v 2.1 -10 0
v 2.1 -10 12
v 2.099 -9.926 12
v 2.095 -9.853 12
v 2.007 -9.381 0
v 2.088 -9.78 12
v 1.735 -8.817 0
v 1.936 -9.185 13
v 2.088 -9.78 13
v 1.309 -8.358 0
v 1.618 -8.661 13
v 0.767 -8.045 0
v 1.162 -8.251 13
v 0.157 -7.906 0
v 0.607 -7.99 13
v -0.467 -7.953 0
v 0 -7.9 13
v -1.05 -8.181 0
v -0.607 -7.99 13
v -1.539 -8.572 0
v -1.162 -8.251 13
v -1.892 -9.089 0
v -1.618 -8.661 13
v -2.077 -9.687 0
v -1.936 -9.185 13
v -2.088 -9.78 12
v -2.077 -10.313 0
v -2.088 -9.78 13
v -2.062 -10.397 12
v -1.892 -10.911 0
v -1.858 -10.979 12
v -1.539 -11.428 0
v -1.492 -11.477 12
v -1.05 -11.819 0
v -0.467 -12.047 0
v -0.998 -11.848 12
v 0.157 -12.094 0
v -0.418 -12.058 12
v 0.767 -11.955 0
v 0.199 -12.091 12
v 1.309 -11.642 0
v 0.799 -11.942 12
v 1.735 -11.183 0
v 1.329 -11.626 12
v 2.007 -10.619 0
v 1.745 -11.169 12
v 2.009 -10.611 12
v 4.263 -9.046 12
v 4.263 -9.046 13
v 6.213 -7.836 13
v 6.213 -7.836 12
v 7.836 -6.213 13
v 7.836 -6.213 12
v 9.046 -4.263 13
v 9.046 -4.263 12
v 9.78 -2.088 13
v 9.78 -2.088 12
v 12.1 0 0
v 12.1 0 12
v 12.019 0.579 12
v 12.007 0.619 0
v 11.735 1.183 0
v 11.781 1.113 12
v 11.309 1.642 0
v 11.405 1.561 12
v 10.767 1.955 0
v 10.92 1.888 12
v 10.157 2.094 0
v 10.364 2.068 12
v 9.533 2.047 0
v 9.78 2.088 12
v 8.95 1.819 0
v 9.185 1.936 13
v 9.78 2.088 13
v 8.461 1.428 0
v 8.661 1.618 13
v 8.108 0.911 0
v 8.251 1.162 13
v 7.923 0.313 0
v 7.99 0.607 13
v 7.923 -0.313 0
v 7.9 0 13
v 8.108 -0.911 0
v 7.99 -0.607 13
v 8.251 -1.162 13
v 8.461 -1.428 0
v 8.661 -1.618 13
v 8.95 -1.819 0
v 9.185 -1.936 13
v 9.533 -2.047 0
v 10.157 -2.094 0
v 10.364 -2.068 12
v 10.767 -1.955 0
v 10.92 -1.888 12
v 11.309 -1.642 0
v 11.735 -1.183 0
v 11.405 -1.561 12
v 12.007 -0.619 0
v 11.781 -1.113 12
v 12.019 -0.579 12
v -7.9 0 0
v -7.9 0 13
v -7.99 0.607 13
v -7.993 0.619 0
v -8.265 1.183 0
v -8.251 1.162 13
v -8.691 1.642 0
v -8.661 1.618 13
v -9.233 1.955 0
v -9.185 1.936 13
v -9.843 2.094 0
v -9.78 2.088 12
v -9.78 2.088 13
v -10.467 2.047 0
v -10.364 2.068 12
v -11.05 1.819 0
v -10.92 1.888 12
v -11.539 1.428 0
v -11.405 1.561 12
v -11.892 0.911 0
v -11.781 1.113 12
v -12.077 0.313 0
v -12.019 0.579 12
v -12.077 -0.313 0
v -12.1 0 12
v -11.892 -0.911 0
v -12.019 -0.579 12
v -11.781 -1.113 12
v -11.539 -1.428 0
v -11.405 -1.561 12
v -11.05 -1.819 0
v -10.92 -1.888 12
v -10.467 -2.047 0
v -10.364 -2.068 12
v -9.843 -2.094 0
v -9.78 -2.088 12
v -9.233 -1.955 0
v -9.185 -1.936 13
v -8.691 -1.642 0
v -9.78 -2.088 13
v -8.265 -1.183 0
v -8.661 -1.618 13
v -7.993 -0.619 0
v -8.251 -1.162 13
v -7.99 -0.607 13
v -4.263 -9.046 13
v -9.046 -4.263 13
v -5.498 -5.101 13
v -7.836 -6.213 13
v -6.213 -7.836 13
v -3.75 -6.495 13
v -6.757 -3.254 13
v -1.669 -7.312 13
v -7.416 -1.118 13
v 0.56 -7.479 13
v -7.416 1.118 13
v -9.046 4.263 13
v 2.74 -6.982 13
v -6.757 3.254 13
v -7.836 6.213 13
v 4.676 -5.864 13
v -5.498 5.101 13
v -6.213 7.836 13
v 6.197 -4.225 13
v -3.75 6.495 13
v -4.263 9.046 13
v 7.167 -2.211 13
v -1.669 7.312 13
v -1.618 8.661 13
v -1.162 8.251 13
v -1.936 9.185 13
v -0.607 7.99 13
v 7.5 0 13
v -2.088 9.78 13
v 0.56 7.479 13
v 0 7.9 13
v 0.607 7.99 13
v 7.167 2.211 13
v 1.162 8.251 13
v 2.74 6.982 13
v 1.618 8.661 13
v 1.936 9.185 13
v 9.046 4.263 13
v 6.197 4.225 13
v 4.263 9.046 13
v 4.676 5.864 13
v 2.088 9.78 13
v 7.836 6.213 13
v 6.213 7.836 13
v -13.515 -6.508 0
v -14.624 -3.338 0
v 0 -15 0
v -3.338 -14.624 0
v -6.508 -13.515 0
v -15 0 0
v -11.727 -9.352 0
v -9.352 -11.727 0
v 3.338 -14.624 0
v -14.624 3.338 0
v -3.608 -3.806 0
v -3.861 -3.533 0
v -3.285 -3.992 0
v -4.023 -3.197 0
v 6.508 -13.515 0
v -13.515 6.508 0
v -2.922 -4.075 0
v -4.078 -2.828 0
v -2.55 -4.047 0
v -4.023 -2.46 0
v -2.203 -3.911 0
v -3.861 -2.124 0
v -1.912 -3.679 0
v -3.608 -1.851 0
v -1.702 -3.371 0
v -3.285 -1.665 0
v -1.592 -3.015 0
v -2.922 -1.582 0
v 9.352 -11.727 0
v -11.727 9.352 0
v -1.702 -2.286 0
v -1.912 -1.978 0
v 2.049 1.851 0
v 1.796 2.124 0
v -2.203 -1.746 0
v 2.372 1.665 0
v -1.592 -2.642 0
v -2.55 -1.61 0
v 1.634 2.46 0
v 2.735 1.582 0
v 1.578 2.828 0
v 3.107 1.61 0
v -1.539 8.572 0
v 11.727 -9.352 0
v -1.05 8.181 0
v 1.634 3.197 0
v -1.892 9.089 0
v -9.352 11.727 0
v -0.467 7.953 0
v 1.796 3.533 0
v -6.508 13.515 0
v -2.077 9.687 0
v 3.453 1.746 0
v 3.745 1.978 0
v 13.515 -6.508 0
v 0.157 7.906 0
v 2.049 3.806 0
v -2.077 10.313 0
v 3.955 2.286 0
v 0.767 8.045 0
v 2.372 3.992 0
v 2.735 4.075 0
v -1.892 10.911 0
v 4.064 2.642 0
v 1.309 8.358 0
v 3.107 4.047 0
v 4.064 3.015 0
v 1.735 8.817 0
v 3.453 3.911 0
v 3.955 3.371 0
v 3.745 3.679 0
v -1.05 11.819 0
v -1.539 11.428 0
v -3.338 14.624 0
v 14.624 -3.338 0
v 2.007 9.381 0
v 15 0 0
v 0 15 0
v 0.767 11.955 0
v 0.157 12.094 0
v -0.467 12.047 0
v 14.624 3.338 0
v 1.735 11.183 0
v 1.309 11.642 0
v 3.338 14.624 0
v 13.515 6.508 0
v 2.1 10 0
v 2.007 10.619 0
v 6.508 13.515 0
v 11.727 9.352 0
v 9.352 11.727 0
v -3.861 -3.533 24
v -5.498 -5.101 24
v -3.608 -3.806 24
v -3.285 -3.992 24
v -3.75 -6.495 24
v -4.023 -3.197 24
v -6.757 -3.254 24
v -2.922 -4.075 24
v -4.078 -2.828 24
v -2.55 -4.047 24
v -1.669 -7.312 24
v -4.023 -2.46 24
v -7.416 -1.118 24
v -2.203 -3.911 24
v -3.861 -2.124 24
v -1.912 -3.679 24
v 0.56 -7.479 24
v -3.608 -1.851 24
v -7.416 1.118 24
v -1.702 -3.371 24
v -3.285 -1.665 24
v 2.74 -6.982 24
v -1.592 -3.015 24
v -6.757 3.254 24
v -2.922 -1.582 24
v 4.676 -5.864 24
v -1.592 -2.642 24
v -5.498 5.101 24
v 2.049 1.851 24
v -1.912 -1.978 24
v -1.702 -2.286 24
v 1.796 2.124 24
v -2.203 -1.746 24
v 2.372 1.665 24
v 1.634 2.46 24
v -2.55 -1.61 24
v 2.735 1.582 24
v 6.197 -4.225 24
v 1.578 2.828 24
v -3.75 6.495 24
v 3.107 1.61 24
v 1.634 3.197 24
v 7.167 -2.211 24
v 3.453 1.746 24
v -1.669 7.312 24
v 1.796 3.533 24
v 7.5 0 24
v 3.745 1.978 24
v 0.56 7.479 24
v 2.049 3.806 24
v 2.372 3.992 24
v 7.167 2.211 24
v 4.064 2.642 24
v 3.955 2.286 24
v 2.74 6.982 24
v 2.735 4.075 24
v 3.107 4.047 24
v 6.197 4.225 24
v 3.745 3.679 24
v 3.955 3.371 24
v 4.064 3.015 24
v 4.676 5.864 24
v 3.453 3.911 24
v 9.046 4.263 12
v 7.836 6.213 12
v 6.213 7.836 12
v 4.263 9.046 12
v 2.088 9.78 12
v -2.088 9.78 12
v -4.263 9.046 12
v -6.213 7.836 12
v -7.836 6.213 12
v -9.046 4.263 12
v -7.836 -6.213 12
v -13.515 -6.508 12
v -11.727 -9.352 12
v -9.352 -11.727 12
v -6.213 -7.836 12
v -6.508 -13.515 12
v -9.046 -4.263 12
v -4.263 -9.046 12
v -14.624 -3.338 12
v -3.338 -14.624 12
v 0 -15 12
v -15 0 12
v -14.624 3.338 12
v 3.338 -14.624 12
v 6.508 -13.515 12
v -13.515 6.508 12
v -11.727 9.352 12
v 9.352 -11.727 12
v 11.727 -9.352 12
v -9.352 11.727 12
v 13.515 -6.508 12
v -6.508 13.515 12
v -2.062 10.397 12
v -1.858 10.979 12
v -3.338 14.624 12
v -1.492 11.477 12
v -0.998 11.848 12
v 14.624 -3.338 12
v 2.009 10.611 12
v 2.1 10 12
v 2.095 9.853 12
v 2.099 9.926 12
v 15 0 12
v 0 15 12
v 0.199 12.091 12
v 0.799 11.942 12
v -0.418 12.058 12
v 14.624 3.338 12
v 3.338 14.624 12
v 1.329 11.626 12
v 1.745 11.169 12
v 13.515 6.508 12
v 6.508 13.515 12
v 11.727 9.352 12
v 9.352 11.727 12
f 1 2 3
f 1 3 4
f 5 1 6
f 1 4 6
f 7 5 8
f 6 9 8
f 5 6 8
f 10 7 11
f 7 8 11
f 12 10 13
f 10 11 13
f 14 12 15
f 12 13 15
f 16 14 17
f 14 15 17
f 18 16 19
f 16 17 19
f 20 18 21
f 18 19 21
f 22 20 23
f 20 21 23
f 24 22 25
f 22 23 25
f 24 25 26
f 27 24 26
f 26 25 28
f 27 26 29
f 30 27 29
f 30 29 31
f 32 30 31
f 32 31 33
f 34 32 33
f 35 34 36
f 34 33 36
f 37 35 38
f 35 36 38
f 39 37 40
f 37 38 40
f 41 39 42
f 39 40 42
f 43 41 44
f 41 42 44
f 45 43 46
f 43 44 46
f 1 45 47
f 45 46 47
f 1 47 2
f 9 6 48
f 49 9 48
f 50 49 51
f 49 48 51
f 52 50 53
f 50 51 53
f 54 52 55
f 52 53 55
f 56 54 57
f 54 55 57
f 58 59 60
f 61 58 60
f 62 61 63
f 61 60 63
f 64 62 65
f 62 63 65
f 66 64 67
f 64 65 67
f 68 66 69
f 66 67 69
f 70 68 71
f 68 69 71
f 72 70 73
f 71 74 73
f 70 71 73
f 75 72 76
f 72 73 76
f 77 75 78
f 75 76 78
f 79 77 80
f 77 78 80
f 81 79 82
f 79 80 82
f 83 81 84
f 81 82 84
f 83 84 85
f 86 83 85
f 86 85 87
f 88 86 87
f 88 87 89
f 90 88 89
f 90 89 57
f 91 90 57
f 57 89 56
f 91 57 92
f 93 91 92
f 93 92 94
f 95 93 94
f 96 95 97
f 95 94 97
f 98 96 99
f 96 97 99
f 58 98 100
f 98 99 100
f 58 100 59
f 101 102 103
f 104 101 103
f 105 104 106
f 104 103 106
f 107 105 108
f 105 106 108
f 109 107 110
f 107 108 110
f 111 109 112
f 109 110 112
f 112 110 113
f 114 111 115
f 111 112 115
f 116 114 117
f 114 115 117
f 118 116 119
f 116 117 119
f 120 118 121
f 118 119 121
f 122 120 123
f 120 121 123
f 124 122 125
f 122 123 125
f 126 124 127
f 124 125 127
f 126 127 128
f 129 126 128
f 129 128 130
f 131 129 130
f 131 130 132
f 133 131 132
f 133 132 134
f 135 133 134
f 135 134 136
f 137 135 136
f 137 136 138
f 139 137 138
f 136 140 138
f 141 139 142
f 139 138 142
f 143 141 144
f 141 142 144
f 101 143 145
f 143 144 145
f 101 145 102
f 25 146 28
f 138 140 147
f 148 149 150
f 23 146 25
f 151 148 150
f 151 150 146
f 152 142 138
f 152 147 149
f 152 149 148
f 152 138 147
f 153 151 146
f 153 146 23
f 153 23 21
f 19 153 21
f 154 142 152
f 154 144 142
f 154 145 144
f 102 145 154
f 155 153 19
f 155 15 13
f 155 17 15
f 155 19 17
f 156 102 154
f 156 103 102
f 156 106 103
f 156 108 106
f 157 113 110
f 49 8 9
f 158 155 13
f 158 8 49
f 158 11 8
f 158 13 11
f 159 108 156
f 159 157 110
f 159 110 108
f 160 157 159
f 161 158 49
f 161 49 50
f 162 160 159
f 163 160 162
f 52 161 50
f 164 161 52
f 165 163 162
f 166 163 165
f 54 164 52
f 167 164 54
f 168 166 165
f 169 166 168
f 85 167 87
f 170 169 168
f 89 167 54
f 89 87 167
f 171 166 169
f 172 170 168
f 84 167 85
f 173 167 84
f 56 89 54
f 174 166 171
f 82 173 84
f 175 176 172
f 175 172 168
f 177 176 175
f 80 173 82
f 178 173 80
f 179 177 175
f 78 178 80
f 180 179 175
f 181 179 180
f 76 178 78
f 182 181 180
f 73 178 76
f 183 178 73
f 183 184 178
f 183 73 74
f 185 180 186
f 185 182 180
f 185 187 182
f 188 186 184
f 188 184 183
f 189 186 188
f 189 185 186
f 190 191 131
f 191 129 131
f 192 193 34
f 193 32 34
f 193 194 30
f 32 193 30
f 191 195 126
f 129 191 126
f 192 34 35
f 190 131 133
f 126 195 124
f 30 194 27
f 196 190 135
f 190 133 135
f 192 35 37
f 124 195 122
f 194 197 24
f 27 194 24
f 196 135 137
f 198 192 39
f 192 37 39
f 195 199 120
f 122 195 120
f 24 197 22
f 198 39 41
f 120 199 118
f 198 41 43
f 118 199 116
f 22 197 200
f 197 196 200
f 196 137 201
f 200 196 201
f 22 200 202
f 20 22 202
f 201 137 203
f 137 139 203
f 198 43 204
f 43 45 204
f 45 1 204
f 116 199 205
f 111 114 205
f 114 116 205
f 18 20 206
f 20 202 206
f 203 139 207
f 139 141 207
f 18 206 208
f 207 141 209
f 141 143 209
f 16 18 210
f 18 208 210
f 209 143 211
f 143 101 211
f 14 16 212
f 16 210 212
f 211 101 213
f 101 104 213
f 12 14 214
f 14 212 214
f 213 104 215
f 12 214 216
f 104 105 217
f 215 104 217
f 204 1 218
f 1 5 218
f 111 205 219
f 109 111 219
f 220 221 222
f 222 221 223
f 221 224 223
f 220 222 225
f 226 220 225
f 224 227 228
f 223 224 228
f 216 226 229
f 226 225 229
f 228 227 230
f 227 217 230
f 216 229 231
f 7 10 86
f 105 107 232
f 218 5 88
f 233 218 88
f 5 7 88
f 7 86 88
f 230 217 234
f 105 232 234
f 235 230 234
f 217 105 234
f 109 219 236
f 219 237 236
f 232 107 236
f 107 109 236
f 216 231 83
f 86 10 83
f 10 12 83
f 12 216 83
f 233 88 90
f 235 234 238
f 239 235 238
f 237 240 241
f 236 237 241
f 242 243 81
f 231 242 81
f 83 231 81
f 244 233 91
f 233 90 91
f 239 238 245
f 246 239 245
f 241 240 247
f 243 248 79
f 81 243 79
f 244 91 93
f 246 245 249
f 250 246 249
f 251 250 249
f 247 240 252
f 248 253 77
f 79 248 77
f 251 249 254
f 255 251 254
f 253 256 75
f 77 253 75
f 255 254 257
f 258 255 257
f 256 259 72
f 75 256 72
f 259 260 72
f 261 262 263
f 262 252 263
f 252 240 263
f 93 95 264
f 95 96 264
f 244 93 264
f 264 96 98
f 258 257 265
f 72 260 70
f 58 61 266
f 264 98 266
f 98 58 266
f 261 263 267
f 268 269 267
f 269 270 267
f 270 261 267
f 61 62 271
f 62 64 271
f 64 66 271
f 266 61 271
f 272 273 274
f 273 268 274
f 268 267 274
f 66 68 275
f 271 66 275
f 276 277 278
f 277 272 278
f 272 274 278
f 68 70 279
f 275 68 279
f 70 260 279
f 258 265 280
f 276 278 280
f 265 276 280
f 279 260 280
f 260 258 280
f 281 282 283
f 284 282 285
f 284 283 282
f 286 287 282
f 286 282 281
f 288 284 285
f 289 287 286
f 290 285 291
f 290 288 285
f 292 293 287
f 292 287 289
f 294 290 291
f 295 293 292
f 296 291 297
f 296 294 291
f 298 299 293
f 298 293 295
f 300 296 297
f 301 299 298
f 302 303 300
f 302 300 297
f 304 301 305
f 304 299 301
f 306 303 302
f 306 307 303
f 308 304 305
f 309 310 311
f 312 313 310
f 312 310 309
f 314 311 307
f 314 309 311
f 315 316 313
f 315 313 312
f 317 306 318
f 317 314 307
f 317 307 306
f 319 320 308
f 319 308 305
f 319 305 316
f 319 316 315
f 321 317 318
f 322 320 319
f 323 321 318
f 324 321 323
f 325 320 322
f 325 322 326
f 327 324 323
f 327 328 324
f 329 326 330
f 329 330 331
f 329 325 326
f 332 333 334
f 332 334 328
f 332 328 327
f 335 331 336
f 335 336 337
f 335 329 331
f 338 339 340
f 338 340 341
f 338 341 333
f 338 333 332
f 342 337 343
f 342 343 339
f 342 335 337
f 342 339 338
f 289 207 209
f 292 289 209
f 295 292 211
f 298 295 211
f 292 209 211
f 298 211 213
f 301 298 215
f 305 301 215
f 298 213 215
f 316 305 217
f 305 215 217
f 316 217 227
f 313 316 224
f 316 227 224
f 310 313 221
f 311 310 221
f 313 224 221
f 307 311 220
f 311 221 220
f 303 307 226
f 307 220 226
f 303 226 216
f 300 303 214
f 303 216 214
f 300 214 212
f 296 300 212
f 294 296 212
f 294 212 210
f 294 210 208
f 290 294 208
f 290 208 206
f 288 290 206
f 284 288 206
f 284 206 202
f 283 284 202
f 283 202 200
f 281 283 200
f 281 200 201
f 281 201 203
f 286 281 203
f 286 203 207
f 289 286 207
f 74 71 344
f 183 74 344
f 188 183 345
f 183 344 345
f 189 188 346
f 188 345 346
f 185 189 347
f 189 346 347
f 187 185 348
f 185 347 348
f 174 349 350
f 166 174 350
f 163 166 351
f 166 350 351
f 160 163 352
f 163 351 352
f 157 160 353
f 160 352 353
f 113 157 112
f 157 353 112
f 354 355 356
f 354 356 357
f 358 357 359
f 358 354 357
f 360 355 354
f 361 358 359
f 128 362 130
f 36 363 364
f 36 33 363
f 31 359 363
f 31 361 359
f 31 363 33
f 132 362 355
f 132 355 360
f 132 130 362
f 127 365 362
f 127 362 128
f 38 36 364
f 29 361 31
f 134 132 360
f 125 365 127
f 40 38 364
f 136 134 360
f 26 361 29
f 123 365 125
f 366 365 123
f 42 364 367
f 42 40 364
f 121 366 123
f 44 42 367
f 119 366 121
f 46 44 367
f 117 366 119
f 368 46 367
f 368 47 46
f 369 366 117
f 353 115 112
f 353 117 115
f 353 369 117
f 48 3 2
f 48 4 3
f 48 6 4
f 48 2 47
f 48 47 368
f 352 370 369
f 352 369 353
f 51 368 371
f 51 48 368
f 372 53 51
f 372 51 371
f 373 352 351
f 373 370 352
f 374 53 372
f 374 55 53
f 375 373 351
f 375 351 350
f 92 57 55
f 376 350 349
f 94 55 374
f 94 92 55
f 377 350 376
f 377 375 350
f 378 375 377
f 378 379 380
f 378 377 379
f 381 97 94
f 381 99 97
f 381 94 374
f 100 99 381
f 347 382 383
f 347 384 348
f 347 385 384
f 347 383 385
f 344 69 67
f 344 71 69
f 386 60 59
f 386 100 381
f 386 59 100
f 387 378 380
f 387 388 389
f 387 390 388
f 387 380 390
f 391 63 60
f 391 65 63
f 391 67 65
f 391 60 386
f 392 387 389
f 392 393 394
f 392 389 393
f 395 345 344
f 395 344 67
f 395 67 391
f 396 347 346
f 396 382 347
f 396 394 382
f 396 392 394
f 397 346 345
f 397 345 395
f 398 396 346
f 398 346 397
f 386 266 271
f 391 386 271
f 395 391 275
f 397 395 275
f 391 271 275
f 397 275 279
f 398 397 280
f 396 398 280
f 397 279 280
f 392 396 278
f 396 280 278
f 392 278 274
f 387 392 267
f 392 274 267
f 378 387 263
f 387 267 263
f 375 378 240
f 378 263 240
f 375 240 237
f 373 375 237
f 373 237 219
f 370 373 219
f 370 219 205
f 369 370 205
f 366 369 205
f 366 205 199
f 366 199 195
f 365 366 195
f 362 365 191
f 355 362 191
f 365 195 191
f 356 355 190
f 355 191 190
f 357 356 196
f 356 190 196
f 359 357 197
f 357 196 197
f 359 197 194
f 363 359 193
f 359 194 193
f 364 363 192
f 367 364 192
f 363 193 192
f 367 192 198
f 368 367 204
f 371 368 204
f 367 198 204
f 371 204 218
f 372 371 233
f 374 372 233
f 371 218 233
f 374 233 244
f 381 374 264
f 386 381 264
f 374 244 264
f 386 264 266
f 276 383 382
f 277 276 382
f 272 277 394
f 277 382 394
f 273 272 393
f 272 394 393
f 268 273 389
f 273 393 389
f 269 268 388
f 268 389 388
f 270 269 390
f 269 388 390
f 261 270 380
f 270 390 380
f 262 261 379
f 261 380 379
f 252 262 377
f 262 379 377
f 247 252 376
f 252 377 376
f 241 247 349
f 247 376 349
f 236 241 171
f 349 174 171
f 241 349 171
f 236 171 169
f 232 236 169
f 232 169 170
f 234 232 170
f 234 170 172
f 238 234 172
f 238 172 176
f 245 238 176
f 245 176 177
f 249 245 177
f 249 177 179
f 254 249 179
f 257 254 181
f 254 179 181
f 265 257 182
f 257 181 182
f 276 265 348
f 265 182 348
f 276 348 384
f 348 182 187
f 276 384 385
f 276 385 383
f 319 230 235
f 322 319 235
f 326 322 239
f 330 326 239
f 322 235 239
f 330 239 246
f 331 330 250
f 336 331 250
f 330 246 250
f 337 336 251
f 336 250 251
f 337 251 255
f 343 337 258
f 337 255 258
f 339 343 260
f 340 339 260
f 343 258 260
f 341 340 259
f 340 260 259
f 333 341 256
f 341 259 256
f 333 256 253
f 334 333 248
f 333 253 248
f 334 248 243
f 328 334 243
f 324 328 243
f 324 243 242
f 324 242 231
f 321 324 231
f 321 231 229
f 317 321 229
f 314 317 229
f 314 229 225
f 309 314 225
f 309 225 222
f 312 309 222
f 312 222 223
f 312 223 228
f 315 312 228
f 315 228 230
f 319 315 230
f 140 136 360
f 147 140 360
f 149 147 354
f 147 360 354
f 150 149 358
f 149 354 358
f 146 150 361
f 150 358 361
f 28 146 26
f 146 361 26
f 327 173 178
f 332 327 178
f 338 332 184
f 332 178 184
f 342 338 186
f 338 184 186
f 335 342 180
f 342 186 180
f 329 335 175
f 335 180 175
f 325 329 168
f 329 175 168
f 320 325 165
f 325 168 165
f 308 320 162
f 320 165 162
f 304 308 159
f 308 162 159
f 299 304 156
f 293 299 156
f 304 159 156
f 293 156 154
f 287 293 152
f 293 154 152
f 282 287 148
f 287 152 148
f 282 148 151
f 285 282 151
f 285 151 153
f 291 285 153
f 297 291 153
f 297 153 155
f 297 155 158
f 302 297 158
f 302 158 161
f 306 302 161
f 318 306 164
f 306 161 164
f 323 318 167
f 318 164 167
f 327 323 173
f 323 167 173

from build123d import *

# Parameters (mm, degrees)
SKETCH_1_R      = 15
EXTRUDE_1_DEPTH = 12
SKETCH_2_R      = 10
EXTRUDE_2_DEPTH = 1
SKETCH_3_R      = 7.5
EXTRUDE_3_DEPTH = 11
M5X0_81_D       = 4.2
M3X0_51_D       = 2.5


with BuildPart() as part:
    # Эскиз1 → Бобышка-Вытянуть1 (new body)
    with BuildSketch(Plane.XY):
        Circle(SKETCH_1_R)
    extrude(amount=EXTRUDE_1_DEPTH)

    # Эскиз2 → Бобышка-Вытянуть2 (add)
    with BuildSketch(Plane.XY.offset(12)):
        Circle(SKETCH_2_R)
    extrude(amount=EXTRUDE_2_DEPTH)

    # Эскиз3 → Бобышка-Вытянуть3 (add)
    with BuildSketch(Plane.XY.offset(13)):
        Circle(SKETCH_3_R)
    extrude(amount=EXTRUDE_3_DEPTH)

    # Отверстие обработанное метчиком M5x0.81 (through all)
    with Locations(Plane(origin=(0, 0, 0), x_dir=(-1, 0, 0), z_dir=(0, 0, -1))):
        with Locations((0, 10), (10, 0), (-10, 0), (0, -10)):
            Hole(M5X0_81_D / 2)

    # Отверстие обработанное метчиком M3x0.51 (through all)
    with Locations(Plane.XY.offset(24)):
        with Locations((-2.828427125, -2.828427125), (2.828427125, 2.828427125)):
            Hole(M3X0_51_D / 2)


solid = part.part
